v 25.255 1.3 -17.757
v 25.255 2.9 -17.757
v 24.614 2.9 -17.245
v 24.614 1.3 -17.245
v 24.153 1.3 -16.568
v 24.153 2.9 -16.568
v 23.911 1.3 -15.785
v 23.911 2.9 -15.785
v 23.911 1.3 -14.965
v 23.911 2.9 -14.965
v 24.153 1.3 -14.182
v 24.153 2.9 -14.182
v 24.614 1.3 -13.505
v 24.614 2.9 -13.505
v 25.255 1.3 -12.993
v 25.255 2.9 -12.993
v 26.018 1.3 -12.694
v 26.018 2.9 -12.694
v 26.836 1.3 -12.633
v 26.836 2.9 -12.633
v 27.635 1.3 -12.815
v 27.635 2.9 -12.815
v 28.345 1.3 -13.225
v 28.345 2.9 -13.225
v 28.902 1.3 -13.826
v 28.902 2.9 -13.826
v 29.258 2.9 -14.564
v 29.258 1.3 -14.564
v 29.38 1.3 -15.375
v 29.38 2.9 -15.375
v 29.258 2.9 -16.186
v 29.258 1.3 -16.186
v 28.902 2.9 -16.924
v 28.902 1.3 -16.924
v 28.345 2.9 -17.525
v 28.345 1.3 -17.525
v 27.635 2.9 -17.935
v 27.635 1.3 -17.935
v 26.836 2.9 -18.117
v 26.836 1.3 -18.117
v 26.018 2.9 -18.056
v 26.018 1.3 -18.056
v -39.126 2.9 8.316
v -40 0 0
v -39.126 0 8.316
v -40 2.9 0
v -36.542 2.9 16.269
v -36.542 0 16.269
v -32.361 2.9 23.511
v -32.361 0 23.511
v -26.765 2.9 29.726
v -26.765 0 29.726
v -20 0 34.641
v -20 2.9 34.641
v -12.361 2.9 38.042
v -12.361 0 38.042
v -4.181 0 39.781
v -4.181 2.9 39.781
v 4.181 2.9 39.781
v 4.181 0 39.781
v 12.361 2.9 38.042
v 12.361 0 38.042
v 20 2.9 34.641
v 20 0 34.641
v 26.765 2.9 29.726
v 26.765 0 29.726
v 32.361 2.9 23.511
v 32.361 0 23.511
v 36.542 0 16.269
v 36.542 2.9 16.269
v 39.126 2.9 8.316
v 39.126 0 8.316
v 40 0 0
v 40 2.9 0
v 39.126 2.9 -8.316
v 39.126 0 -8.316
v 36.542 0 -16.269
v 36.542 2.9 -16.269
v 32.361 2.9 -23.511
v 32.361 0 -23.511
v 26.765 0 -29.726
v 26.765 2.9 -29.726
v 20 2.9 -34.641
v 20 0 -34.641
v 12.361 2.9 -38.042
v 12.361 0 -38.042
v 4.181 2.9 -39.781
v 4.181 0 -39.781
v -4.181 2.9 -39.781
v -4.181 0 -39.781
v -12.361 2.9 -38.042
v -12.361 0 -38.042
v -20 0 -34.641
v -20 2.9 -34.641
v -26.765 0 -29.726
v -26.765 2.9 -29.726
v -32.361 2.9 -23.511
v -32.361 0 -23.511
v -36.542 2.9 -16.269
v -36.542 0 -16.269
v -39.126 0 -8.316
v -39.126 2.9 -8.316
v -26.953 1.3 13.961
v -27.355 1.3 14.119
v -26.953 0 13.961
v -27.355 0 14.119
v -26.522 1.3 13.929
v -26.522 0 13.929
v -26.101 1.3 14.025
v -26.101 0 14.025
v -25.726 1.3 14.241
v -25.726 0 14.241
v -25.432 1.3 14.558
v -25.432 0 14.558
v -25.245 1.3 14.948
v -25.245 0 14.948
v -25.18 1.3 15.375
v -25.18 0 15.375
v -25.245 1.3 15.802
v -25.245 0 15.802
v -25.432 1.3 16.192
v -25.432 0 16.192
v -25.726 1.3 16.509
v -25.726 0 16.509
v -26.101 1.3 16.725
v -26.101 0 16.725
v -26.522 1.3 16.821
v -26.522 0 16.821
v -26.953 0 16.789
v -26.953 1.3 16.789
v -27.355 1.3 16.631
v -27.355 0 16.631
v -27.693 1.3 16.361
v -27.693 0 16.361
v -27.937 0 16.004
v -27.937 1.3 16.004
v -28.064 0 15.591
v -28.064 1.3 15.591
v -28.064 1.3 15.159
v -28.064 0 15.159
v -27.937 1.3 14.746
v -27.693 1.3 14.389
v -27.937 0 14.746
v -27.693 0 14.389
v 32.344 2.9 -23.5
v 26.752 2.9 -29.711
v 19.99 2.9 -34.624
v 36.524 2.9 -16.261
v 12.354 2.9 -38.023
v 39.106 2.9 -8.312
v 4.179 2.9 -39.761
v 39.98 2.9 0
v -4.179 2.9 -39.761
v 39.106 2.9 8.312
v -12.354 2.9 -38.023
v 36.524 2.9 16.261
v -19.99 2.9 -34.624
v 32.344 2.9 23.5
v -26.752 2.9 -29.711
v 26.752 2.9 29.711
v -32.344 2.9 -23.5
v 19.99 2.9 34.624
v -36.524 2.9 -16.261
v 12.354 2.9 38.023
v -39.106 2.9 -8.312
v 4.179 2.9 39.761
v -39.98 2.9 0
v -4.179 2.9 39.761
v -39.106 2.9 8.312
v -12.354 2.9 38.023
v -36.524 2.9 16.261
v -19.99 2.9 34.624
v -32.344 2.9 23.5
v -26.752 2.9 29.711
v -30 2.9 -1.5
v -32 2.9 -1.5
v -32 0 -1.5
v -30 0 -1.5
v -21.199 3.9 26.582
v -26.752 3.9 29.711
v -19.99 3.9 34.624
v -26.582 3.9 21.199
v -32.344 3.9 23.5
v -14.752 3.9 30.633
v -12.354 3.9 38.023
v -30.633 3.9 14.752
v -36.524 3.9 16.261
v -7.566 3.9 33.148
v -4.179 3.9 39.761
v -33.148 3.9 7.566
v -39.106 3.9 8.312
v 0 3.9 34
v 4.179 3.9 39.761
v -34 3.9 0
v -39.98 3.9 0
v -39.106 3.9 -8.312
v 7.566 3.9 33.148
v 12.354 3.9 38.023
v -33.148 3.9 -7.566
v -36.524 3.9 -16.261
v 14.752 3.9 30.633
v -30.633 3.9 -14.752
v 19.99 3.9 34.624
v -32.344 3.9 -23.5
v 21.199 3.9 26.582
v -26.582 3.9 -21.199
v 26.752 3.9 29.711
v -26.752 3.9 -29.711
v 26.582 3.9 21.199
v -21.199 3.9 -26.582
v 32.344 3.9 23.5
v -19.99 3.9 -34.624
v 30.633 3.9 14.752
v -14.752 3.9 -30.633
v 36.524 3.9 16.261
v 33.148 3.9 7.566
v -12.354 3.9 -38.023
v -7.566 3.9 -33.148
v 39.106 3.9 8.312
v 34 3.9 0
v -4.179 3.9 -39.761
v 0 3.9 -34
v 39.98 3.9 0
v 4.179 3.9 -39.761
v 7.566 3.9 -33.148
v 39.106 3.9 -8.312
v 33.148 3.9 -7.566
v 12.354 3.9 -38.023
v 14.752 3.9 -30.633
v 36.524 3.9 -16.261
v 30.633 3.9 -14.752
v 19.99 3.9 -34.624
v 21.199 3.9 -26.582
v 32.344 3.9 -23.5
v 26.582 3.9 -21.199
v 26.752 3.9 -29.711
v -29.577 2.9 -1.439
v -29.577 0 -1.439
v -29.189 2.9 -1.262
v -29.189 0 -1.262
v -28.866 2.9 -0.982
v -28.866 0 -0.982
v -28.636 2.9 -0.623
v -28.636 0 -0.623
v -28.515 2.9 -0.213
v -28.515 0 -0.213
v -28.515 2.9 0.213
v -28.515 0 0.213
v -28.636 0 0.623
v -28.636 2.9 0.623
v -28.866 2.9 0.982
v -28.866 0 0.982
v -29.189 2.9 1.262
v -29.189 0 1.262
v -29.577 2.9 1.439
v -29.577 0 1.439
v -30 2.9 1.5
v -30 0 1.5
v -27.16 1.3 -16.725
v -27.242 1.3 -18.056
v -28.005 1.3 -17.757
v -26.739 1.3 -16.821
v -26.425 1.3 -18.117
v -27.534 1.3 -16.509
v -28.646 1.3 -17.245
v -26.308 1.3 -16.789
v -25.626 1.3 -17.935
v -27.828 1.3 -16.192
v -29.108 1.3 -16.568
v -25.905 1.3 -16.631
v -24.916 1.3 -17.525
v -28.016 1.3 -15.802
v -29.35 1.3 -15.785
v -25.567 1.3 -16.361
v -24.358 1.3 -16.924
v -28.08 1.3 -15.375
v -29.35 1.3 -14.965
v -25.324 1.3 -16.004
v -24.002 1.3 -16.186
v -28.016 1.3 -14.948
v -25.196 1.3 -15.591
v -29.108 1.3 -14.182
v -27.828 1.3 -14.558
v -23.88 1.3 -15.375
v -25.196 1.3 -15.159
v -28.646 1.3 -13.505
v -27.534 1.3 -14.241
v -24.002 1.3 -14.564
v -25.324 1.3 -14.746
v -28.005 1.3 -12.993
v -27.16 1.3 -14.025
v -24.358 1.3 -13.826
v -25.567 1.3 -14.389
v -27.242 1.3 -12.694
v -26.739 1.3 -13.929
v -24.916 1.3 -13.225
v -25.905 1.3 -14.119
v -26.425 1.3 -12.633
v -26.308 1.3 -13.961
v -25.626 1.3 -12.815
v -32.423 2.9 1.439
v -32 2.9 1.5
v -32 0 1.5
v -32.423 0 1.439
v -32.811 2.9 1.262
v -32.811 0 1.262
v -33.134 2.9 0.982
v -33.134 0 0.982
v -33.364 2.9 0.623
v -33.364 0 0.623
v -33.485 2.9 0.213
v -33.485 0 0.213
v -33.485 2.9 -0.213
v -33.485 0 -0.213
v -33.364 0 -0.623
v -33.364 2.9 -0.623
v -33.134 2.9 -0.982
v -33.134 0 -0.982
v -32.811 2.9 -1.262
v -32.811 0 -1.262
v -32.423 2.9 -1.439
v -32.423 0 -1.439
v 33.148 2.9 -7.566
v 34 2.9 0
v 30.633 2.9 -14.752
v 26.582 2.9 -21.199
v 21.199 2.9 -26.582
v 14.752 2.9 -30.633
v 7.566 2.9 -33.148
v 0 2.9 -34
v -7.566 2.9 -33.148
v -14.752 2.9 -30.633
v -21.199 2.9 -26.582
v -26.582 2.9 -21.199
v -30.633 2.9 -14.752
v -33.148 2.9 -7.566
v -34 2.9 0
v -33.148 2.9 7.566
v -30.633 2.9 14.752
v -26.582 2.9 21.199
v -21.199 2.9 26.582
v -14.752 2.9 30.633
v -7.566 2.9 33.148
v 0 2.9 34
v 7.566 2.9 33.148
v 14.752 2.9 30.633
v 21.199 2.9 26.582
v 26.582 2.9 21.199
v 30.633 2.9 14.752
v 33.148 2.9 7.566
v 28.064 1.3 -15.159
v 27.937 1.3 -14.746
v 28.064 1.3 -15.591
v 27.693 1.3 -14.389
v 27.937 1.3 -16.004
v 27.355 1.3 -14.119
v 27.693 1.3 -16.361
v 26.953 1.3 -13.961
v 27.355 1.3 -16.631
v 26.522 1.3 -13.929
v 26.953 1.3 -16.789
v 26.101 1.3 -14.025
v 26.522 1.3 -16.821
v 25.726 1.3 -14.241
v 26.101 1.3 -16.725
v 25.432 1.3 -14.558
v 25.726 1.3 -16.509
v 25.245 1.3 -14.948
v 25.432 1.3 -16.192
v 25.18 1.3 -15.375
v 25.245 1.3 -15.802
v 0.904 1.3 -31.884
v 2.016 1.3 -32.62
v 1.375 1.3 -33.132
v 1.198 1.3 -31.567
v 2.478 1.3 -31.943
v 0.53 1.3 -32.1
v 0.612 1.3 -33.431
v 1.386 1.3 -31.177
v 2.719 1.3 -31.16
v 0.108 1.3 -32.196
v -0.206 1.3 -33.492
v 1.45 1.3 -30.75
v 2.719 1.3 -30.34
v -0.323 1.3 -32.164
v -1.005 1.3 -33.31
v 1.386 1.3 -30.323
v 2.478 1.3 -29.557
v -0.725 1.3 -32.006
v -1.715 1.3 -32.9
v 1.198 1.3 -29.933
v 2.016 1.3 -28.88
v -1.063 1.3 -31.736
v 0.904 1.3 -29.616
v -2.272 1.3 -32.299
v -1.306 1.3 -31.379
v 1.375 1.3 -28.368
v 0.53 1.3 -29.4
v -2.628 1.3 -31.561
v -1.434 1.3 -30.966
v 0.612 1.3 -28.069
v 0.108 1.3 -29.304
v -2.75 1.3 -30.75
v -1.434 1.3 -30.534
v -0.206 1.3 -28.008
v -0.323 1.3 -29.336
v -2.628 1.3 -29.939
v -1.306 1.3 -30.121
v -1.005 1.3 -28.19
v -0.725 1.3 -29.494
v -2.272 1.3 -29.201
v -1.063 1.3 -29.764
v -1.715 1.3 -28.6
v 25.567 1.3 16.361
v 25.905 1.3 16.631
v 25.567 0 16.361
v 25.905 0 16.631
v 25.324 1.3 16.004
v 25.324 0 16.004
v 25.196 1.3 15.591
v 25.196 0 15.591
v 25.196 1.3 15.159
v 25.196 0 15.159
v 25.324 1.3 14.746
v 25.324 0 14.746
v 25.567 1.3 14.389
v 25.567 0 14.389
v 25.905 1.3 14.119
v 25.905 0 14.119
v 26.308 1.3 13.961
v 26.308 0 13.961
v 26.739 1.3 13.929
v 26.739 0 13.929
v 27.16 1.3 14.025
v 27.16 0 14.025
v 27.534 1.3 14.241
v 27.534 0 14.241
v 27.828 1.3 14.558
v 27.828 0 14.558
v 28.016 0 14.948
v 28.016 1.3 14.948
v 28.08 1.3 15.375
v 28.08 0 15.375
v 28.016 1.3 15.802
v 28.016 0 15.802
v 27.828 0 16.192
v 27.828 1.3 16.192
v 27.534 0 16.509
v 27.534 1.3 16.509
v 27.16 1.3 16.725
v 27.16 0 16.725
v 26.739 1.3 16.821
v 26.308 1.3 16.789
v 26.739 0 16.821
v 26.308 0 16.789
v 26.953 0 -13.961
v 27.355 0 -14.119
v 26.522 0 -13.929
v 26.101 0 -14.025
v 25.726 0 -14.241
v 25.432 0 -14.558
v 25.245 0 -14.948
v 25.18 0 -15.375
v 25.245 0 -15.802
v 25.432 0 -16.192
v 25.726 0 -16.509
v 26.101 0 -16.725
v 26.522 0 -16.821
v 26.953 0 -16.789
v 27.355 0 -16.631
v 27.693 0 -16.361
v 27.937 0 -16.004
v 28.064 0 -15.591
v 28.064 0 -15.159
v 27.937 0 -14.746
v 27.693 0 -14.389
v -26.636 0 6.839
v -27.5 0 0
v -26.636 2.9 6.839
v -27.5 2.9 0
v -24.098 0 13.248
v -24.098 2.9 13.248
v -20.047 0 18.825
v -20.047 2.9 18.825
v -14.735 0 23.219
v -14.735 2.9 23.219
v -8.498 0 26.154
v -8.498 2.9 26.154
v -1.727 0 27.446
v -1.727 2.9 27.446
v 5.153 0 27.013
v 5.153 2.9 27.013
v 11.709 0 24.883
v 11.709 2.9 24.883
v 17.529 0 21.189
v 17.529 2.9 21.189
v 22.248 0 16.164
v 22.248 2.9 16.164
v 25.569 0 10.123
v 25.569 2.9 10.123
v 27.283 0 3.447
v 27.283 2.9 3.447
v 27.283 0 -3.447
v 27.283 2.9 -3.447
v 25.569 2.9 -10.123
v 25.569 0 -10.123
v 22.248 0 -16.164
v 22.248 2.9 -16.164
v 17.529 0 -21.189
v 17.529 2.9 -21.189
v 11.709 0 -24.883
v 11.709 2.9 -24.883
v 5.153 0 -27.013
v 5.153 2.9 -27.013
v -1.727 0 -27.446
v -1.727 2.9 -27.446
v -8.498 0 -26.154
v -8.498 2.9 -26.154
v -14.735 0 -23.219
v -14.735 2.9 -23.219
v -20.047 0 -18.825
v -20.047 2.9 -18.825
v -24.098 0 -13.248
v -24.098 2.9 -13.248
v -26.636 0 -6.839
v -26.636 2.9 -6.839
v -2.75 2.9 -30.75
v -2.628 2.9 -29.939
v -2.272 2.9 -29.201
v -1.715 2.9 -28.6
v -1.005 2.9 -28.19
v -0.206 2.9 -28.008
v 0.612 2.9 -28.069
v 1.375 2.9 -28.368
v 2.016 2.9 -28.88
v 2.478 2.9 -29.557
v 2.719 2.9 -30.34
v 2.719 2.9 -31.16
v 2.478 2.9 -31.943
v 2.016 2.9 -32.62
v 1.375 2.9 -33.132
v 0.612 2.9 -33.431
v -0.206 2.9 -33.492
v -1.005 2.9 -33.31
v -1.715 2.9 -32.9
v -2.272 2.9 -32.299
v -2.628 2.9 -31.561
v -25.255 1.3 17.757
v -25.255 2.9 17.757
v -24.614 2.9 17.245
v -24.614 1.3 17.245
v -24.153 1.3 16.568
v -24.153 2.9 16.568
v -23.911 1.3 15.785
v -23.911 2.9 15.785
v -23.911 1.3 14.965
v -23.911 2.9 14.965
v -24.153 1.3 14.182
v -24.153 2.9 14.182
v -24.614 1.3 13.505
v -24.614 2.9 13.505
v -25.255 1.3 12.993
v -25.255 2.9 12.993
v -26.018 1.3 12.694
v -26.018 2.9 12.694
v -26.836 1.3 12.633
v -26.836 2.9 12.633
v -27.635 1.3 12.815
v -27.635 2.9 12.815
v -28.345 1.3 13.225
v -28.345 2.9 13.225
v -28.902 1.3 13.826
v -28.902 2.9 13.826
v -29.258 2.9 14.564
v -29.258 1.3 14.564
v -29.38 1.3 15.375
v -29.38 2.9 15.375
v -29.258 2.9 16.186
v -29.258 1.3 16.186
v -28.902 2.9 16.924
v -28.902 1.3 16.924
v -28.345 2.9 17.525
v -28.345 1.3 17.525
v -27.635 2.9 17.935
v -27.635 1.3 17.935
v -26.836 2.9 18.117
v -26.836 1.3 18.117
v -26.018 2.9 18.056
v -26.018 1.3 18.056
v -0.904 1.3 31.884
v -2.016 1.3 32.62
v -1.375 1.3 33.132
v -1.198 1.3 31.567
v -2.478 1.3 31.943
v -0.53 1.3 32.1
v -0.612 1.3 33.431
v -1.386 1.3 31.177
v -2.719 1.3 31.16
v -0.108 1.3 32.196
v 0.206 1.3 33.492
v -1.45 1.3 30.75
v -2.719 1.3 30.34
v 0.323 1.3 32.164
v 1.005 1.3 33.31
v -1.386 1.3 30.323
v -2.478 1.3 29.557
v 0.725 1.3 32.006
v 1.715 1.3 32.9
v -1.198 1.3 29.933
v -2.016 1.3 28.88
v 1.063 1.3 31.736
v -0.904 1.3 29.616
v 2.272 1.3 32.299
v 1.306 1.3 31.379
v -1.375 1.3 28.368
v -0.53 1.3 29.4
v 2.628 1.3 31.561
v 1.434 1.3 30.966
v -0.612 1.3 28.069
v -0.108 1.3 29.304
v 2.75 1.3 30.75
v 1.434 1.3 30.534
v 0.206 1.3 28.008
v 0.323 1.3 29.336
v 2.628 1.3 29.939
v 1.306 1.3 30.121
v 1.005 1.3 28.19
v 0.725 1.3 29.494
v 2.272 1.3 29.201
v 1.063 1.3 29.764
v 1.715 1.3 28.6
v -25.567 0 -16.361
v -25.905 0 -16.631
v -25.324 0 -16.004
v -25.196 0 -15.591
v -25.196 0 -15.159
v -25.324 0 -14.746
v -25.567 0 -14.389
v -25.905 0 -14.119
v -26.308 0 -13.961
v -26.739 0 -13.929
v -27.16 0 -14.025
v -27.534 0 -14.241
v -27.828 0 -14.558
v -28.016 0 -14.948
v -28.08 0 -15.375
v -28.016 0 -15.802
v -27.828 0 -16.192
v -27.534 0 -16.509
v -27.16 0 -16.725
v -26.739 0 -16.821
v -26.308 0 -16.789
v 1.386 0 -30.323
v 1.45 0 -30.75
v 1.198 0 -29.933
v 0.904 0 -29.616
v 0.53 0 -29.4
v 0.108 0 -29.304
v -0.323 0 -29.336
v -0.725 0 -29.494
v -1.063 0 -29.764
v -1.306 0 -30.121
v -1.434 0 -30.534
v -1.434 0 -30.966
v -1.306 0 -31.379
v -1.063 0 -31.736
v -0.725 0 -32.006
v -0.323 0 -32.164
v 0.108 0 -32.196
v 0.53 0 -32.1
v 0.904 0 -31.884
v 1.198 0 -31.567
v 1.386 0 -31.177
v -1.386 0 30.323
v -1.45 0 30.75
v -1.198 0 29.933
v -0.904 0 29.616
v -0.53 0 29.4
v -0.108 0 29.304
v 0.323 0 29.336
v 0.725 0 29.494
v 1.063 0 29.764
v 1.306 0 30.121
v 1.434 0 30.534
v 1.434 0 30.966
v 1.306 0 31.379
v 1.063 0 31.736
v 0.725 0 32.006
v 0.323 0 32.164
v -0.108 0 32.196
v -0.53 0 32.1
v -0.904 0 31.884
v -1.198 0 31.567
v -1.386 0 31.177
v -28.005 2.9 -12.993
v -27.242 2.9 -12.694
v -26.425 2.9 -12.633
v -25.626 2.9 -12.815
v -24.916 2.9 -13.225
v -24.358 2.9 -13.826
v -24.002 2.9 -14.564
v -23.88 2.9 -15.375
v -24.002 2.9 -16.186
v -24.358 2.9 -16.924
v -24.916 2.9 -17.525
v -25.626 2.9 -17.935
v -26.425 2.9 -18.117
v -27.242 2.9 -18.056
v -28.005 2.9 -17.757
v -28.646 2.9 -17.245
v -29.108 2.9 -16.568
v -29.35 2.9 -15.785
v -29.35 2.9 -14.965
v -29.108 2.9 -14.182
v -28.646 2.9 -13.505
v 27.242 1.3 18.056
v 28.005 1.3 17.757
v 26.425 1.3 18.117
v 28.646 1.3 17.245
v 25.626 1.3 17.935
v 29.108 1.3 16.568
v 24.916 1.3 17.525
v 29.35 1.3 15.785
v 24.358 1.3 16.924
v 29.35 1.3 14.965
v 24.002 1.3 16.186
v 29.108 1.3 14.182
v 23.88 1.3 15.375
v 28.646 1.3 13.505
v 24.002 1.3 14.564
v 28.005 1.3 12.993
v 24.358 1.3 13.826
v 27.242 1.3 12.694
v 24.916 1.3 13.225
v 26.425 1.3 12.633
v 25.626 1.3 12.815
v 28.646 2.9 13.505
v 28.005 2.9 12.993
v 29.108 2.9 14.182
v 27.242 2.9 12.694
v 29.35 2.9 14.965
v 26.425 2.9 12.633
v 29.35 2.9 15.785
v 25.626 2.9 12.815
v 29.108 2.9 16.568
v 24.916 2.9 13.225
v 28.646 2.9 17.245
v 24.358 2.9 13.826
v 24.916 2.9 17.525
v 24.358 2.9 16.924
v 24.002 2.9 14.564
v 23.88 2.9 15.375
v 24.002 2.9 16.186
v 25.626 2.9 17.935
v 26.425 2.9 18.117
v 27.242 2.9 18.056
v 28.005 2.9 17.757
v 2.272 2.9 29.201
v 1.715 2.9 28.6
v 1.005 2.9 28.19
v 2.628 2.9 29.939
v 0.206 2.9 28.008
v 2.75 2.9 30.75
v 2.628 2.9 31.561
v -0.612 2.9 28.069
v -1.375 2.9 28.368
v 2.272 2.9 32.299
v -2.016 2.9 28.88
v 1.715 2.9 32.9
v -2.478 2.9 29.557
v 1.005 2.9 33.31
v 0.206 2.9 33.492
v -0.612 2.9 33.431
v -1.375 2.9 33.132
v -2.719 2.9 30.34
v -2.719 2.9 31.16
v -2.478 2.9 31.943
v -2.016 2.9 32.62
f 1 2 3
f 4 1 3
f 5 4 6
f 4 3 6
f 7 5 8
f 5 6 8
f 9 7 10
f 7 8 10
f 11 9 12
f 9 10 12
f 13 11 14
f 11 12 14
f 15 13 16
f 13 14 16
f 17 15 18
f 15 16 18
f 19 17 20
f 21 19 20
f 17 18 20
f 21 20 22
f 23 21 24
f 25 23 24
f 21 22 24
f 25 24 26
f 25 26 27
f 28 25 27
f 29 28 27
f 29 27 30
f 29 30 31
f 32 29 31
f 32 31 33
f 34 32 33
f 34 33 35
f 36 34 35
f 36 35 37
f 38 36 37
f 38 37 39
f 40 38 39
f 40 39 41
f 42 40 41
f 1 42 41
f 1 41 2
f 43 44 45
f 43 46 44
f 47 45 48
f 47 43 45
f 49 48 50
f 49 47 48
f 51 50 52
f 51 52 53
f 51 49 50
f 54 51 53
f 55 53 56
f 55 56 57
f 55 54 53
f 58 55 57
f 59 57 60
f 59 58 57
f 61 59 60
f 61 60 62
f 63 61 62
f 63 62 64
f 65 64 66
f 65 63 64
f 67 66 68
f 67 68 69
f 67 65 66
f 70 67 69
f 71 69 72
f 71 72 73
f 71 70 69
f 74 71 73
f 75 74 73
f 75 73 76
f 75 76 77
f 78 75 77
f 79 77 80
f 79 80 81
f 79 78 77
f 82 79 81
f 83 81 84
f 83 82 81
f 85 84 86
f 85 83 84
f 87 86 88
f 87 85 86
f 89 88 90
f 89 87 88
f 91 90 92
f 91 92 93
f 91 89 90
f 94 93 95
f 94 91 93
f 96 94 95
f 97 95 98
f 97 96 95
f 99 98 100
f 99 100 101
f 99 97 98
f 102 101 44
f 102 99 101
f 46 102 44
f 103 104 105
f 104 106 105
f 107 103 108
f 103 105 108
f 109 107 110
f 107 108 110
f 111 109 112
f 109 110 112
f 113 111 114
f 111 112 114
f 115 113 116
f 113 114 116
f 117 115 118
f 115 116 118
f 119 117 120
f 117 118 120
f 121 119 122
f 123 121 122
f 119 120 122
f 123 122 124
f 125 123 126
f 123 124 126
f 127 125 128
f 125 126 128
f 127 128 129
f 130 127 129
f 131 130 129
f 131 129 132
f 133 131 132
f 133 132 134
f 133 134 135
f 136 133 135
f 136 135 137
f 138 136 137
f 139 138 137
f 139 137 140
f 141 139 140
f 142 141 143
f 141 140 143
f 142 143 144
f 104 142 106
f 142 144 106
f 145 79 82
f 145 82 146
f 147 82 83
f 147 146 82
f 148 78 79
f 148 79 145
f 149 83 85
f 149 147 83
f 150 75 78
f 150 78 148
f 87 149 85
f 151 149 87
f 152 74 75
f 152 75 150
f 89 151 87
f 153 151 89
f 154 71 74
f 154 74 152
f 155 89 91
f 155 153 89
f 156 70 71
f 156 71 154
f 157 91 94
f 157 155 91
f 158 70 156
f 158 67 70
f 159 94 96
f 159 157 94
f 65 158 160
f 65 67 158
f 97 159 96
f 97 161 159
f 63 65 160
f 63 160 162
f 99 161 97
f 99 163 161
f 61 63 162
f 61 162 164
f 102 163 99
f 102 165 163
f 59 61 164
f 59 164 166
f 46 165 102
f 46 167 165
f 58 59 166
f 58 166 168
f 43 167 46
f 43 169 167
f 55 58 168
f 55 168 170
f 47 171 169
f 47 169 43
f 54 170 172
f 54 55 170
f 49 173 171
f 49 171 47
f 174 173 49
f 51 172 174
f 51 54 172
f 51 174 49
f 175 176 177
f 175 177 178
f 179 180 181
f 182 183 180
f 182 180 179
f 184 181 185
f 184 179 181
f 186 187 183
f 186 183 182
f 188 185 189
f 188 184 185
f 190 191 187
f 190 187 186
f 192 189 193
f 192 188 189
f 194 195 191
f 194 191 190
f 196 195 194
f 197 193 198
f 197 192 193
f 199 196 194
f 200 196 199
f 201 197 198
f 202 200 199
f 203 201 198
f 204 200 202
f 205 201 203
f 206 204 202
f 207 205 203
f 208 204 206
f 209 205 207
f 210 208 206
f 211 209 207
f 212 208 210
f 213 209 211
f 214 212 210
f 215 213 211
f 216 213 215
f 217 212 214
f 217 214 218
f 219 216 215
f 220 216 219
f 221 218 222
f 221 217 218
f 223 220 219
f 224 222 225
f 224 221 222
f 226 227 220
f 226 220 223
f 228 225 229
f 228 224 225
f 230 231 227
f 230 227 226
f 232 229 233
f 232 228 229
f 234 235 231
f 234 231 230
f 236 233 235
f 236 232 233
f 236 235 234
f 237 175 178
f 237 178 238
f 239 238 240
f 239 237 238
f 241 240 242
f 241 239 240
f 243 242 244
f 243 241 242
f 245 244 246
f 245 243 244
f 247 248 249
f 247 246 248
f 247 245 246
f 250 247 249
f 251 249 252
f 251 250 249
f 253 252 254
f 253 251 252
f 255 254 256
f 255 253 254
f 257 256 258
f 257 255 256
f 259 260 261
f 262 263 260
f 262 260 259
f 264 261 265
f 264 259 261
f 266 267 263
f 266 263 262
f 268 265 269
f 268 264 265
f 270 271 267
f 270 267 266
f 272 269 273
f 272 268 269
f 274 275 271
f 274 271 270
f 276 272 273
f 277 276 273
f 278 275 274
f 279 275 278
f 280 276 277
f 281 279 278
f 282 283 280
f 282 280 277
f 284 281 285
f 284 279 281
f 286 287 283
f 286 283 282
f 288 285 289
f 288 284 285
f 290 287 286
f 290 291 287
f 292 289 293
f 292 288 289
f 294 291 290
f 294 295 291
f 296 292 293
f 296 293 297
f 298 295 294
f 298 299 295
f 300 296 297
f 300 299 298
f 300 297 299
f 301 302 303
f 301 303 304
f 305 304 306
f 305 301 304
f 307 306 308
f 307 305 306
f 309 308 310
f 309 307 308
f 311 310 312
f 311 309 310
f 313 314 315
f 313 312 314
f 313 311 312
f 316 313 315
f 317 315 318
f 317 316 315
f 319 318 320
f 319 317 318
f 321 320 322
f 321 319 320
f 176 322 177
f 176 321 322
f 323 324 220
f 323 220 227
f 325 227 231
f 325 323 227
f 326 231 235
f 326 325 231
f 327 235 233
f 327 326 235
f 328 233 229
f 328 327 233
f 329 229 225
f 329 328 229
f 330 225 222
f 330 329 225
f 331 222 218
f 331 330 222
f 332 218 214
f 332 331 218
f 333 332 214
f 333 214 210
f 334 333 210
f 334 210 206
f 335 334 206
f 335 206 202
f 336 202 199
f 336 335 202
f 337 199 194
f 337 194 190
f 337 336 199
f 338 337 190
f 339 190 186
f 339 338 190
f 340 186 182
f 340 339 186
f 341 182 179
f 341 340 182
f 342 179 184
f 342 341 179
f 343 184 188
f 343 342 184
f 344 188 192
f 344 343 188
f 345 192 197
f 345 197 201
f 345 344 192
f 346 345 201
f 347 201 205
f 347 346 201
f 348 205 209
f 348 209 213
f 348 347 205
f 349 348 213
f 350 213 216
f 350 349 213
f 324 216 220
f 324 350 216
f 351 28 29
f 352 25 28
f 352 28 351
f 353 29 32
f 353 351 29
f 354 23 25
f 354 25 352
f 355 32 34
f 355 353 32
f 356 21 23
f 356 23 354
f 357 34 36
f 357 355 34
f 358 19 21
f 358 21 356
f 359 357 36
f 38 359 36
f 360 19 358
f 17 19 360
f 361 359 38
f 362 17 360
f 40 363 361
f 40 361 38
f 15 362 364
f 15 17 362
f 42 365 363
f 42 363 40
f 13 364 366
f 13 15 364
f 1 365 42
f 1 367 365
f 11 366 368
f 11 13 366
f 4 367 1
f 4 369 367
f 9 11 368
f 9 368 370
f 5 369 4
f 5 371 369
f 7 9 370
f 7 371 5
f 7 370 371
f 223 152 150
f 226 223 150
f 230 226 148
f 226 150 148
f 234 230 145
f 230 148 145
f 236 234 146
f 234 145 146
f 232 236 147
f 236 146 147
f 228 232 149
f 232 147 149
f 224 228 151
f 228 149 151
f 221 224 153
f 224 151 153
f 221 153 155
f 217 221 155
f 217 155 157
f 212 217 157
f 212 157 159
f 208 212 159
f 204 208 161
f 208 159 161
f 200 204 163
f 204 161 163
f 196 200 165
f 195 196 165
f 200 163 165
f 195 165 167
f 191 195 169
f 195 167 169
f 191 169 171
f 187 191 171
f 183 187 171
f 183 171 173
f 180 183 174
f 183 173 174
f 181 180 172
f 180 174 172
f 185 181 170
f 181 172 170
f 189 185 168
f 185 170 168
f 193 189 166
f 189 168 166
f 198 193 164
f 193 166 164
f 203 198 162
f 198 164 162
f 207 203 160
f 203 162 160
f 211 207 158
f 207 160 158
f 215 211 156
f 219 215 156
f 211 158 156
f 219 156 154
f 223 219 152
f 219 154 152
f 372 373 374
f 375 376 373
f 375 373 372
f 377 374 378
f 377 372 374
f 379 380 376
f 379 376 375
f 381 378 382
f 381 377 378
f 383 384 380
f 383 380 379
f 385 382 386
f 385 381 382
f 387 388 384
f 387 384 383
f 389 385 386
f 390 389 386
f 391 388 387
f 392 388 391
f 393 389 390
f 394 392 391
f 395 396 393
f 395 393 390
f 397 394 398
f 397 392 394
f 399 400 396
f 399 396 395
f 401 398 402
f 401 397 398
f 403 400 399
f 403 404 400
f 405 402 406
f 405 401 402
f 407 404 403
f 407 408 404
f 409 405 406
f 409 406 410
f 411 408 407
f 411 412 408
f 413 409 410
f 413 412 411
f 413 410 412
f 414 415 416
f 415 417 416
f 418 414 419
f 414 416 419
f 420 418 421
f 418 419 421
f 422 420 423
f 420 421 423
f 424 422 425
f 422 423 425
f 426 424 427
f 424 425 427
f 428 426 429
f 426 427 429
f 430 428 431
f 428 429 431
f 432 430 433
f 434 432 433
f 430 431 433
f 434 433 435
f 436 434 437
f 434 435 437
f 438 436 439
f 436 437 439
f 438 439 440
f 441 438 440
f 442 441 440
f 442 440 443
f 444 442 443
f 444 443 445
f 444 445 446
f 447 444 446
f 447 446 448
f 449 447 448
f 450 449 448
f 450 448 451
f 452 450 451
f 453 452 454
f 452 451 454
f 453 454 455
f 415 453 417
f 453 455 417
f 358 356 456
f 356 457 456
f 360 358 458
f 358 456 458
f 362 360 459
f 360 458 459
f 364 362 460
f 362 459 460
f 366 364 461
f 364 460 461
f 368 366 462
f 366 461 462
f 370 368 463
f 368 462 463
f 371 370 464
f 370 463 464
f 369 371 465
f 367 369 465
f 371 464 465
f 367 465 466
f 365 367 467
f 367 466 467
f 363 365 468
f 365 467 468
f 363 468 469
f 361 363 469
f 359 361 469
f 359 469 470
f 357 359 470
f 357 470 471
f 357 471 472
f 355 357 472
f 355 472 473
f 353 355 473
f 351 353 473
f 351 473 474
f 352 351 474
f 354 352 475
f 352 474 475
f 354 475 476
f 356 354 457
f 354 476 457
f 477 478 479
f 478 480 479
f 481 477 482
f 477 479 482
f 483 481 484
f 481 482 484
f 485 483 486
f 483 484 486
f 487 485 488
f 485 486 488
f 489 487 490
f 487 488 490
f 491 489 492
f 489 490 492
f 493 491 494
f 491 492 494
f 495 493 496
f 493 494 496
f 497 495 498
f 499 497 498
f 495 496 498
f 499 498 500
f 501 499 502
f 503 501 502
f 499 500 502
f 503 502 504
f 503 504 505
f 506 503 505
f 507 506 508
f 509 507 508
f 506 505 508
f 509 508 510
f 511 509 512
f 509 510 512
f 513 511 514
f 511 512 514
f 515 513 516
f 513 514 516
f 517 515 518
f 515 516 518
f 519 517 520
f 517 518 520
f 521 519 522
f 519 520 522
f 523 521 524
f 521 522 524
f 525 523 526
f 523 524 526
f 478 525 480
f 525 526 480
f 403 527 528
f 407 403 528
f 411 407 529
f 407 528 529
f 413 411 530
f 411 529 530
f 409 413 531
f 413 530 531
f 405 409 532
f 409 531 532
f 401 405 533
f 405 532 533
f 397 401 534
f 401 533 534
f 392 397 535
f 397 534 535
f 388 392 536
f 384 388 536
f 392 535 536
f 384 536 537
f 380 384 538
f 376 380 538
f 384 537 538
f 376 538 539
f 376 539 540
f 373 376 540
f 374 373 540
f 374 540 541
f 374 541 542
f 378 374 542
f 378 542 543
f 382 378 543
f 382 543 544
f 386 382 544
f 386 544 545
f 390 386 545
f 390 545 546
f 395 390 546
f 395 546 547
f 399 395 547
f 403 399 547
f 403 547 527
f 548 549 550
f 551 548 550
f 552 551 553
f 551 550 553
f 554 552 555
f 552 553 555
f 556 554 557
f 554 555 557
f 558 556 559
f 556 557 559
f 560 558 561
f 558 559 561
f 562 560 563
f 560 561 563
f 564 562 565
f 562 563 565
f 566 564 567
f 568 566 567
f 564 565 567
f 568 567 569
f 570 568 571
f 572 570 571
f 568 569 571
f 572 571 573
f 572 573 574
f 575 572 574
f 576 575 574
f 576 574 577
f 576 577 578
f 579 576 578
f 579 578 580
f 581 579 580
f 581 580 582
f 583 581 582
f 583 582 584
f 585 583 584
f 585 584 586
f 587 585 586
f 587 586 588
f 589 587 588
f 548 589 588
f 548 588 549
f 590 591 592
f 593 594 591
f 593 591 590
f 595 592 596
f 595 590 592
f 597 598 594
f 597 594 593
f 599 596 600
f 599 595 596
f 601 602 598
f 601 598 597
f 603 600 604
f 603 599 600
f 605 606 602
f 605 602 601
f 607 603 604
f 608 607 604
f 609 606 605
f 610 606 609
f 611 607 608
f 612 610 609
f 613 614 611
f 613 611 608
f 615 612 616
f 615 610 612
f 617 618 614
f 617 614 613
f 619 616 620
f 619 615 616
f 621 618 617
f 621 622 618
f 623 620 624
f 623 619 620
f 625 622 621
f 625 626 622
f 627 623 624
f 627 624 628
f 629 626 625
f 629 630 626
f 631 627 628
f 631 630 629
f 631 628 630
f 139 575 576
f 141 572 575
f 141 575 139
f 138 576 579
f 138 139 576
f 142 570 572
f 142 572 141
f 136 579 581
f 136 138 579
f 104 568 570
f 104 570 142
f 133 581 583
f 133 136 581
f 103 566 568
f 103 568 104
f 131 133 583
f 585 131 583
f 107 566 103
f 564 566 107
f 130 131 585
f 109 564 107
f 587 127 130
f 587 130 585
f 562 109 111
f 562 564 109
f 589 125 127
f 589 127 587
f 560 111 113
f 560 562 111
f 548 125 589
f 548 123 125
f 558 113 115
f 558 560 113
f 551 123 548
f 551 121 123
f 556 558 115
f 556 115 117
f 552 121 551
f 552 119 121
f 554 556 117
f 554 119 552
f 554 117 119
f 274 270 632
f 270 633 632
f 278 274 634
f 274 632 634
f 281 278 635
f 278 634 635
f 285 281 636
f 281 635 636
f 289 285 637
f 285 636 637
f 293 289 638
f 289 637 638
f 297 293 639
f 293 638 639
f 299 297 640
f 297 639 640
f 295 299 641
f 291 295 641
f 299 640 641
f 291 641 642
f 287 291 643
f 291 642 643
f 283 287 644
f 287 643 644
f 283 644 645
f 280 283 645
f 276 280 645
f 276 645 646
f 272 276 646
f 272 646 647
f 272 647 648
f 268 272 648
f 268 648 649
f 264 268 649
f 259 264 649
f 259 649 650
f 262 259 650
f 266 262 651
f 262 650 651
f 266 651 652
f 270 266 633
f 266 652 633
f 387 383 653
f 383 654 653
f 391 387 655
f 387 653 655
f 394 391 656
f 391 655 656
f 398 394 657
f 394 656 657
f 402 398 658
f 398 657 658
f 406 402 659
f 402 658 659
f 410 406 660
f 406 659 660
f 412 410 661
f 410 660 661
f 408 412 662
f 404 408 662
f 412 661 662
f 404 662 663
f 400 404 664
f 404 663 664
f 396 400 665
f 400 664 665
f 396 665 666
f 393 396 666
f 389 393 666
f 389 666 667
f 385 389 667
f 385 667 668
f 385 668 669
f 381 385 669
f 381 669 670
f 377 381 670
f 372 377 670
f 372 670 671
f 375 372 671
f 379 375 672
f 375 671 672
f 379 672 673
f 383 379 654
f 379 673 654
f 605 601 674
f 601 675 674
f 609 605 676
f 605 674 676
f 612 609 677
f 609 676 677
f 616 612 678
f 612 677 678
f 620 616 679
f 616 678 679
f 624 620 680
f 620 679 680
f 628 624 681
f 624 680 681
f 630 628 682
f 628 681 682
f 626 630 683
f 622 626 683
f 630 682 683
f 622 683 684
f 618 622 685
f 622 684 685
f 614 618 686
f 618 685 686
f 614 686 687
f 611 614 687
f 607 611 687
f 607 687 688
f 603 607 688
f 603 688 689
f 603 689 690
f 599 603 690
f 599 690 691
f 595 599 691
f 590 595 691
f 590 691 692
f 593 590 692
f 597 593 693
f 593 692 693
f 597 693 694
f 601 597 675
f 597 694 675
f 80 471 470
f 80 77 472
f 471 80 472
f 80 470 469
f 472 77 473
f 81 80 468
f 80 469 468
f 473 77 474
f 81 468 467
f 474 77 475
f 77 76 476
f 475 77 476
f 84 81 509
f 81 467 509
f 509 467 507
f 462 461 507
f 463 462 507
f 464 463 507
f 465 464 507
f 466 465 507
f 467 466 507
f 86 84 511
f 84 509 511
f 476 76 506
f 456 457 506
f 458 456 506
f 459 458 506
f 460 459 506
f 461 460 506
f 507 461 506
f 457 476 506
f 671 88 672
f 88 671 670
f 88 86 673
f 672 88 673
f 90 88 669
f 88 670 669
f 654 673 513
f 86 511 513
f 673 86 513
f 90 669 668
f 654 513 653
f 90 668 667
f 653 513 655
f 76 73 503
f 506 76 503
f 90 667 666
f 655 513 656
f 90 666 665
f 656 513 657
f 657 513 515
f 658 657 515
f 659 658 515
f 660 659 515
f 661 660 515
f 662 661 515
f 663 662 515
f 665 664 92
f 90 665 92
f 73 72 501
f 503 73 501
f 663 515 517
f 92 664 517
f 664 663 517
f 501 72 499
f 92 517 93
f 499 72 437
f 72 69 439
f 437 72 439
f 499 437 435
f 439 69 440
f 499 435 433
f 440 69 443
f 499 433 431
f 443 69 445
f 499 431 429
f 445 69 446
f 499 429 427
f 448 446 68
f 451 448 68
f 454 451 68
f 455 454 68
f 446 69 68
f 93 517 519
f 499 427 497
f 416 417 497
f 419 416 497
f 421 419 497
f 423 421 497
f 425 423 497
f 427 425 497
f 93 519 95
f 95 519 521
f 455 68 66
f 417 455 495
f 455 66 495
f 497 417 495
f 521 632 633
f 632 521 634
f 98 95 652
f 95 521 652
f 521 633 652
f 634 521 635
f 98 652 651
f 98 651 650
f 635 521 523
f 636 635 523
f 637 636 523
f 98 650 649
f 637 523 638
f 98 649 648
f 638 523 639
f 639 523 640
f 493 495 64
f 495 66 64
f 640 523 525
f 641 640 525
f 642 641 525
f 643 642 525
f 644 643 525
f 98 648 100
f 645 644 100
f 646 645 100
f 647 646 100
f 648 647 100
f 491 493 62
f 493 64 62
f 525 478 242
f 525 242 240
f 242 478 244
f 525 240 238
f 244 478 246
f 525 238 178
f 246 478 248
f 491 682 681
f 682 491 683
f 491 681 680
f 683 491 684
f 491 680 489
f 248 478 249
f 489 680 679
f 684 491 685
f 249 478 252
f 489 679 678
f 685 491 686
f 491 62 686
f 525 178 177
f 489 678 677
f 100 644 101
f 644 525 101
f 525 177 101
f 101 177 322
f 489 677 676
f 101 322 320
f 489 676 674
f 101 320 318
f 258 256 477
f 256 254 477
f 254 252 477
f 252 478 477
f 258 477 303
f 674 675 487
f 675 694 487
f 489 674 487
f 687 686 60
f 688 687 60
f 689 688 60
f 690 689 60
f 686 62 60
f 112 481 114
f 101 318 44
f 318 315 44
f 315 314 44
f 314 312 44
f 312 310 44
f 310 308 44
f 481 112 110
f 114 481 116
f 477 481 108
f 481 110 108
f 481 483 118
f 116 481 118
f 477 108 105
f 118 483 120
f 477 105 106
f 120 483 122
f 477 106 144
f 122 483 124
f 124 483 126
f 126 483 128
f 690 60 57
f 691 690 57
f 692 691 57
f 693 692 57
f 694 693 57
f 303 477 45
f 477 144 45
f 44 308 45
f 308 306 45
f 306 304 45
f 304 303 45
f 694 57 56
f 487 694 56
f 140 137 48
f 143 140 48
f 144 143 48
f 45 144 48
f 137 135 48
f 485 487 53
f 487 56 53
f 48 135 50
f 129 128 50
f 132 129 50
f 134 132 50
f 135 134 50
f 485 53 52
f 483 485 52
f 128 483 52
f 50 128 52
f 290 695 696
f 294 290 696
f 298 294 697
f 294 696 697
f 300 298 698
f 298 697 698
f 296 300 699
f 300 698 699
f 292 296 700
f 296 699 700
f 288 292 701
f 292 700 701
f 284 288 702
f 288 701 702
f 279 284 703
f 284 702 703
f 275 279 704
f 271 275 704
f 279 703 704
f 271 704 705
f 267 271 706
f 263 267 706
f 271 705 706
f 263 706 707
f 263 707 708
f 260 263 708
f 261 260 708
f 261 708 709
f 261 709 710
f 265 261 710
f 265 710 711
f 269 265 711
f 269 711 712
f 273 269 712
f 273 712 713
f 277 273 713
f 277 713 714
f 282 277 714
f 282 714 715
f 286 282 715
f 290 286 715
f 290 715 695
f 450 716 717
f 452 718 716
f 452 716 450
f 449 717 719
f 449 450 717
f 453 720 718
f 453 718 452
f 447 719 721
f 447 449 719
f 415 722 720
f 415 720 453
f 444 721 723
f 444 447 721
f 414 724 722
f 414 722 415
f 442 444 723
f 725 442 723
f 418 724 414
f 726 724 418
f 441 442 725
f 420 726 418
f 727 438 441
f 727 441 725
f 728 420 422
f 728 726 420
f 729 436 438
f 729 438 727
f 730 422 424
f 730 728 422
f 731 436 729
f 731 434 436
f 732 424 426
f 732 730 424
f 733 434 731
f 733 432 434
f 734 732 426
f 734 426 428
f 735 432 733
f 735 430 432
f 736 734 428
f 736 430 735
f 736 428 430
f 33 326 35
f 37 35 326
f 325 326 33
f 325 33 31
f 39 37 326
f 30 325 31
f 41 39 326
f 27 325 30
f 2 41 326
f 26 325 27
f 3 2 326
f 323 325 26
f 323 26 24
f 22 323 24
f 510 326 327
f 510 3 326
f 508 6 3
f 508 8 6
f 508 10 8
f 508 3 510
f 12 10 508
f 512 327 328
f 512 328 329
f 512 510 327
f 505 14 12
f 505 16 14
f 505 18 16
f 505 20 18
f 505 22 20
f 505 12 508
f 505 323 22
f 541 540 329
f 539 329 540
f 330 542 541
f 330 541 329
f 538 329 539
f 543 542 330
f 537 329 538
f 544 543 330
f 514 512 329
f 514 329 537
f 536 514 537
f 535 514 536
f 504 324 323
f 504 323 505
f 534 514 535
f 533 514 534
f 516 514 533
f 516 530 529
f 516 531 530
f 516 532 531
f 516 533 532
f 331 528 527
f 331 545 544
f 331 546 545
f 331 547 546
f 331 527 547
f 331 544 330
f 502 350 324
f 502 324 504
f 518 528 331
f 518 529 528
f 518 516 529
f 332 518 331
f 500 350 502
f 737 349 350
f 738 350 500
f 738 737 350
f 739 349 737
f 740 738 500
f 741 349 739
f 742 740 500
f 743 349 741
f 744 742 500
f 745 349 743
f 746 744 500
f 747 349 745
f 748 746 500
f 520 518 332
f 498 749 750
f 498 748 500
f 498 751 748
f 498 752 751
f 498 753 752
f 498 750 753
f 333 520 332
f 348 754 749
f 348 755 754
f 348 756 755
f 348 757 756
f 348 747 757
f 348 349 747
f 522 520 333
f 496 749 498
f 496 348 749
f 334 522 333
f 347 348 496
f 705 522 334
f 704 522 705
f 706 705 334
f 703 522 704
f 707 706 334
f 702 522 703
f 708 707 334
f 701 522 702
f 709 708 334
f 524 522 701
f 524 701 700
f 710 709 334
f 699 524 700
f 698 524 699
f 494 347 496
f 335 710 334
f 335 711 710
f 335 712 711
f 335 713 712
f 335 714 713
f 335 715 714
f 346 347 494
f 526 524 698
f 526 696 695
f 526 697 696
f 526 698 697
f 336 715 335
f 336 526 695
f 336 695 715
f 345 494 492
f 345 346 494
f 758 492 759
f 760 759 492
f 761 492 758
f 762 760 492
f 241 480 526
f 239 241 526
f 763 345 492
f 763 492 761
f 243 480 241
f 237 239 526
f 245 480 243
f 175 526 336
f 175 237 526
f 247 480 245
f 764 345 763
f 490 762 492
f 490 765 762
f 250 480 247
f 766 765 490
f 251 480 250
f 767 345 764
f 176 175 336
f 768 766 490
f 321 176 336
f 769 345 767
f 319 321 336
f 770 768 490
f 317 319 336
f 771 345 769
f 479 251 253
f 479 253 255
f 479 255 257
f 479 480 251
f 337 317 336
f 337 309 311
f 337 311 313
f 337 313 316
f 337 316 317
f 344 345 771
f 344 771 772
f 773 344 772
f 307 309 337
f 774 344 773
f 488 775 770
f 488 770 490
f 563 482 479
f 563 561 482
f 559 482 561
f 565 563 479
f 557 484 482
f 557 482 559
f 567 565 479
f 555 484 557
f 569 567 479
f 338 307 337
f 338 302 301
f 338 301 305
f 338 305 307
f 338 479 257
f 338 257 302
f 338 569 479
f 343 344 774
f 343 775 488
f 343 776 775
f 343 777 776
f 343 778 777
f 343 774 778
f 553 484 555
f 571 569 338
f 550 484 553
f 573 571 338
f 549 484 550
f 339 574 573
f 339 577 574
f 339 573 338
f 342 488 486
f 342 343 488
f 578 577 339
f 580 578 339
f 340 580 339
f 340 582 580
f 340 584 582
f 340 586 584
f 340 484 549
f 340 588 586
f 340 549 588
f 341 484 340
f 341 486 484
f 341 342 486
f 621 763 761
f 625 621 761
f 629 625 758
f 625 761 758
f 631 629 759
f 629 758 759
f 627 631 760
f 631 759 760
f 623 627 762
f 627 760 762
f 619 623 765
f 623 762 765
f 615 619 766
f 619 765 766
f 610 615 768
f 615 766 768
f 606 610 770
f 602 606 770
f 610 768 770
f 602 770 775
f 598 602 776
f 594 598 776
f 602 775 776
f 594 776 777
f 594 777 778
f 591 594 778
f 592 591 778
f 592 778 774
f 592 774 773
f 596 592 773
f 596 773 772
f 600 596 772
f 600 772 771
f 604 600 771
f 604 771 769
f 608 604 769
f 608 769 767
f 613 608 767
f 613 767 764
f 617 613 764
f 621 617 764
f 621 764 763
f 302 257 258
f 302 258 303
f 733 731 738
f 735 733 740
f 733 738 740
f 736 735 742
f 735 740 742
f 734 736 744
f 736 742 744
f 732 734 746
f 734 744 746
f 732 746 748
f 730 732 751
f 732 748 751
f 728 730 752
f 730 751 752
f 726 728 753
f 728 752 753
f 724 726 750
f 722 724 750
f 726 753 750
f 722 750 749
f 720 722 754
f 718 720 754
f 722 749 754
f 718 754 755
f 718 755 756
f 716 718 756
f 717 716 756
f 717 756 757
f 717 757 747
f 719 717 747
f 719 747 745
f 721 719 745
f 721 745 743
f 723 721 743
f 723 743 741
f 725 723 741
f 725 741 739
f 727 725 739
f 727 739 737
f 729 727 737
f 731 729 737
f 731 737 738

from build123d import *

# Parameters (mm, degrees)
SKETCH1_W                                            = 12.5
SKETCH1_H                                            = 2.9
CBORE_FOR_M2_5_HEX_SOCKET_HEAD_CAP_SCREW_D           = 2.9
CBORE_FOR_M2_5_HEX_SOCKET_HEAD_CAP_SCREW_CBORE_D     = 5.5
CBORE_FOR_M2_5_HEX_SOCKET_HEAD_CAP_SCREW_CBORE_DEPTH = 2.1
CIRPATTERN1_COUNT                                    = 6
CUT_EXTRUDE4_DEPTH                                   = 10
SKETCH5_R                                            = 39.98
SKETCH5_R_2                                          = 34
BOSS_EXTRUDE1_DEPTH                                  = 1


with BuildPart() as part:
    # Sketch1 → Revolve1 (revolve)
    with BuildSketch(Plane.XY):
        with Locations((-33.75, 1.45)):
            Rectangle(SKETCH1_W, SKETCH1_H)
    revolve(axis=Axis((0, -3.243860323, 0), (0, 1, 0)))

    # CBORE for M2.5 Hex Socket Head Cap Screw2 (through all)
    with Locations(Plane(origin=(0, 3.4, 0), x_dir=(-1, 0, 0), z_dir=(0, 1, 0))):
        with Locations((0, -30.75)):
            cbore_for_m2_5_hex_socket_head_cap_screw = CounterBoreHole(CBORE_FOR_M2_5_HEX_SOCKET_HEAD_CAP_SCREW_D / 2, CBORE_FOR_M2_5_HEX_SOCKET_HEAD_CAP_SCREW_CBORE_D / 2, CBORE_FOR_M2_5_HEX_SOCKET_HEAD_CAP_SCREW_CBORE_DEPTH)

    # CirPattern1: CBORE for M2.5 Hex Socket Head Cap Screw2 ×6 about axis
    cirpattern1_axis = Axis((0, 0, 0), (0, 1, 0))
    for i in range(1, CIRPATTERN1_COUNT):
        add(cbore_for_m2_5_hex_socket_head_cap_screw.rotate(cirpattern1_axis, i * 360 / CIRPATTERN1_COUNT), mode=Mode.SUBTRACT)

    # Sketch10 → Cut-Extrude4 (cut)
    with BuildSketch(Plane(origin=(0, 2.9, 0), x_dir=(1, 0, 0), z_dir=(0, 1, 0))):
        with BuildLine():
            Line((-32, 1.5), (-30, 1.5))
            ThreePointArc((-30, 1.5), (-28.5, 0), (-30, -1.5))
            Line((-30, -1.5), (-32, -1.5))
            ThreePointArc((-32, -1.5), (-33.5, 0), (-32, 1.5))
        make_face()
    extrude(amount=-CUT_EXTRUDE4_DEPTH, mode=Mode.SUBTRACT)

    # Sketch5 → Boss-Extrude1 (add)
    with BuildSketch(Plane(origin=(0, 2.9, 0), x_dir=(1, 0, 0), z_dir=(0, 1, 0))):
        Circle(SKETCH5_R)
        Circle(SKETCH5_R_2, mode=Mode.SUBTRACT)
    extrude(amount=BOSS_EXTRUDE1_DEPTH)


solid = part.part
